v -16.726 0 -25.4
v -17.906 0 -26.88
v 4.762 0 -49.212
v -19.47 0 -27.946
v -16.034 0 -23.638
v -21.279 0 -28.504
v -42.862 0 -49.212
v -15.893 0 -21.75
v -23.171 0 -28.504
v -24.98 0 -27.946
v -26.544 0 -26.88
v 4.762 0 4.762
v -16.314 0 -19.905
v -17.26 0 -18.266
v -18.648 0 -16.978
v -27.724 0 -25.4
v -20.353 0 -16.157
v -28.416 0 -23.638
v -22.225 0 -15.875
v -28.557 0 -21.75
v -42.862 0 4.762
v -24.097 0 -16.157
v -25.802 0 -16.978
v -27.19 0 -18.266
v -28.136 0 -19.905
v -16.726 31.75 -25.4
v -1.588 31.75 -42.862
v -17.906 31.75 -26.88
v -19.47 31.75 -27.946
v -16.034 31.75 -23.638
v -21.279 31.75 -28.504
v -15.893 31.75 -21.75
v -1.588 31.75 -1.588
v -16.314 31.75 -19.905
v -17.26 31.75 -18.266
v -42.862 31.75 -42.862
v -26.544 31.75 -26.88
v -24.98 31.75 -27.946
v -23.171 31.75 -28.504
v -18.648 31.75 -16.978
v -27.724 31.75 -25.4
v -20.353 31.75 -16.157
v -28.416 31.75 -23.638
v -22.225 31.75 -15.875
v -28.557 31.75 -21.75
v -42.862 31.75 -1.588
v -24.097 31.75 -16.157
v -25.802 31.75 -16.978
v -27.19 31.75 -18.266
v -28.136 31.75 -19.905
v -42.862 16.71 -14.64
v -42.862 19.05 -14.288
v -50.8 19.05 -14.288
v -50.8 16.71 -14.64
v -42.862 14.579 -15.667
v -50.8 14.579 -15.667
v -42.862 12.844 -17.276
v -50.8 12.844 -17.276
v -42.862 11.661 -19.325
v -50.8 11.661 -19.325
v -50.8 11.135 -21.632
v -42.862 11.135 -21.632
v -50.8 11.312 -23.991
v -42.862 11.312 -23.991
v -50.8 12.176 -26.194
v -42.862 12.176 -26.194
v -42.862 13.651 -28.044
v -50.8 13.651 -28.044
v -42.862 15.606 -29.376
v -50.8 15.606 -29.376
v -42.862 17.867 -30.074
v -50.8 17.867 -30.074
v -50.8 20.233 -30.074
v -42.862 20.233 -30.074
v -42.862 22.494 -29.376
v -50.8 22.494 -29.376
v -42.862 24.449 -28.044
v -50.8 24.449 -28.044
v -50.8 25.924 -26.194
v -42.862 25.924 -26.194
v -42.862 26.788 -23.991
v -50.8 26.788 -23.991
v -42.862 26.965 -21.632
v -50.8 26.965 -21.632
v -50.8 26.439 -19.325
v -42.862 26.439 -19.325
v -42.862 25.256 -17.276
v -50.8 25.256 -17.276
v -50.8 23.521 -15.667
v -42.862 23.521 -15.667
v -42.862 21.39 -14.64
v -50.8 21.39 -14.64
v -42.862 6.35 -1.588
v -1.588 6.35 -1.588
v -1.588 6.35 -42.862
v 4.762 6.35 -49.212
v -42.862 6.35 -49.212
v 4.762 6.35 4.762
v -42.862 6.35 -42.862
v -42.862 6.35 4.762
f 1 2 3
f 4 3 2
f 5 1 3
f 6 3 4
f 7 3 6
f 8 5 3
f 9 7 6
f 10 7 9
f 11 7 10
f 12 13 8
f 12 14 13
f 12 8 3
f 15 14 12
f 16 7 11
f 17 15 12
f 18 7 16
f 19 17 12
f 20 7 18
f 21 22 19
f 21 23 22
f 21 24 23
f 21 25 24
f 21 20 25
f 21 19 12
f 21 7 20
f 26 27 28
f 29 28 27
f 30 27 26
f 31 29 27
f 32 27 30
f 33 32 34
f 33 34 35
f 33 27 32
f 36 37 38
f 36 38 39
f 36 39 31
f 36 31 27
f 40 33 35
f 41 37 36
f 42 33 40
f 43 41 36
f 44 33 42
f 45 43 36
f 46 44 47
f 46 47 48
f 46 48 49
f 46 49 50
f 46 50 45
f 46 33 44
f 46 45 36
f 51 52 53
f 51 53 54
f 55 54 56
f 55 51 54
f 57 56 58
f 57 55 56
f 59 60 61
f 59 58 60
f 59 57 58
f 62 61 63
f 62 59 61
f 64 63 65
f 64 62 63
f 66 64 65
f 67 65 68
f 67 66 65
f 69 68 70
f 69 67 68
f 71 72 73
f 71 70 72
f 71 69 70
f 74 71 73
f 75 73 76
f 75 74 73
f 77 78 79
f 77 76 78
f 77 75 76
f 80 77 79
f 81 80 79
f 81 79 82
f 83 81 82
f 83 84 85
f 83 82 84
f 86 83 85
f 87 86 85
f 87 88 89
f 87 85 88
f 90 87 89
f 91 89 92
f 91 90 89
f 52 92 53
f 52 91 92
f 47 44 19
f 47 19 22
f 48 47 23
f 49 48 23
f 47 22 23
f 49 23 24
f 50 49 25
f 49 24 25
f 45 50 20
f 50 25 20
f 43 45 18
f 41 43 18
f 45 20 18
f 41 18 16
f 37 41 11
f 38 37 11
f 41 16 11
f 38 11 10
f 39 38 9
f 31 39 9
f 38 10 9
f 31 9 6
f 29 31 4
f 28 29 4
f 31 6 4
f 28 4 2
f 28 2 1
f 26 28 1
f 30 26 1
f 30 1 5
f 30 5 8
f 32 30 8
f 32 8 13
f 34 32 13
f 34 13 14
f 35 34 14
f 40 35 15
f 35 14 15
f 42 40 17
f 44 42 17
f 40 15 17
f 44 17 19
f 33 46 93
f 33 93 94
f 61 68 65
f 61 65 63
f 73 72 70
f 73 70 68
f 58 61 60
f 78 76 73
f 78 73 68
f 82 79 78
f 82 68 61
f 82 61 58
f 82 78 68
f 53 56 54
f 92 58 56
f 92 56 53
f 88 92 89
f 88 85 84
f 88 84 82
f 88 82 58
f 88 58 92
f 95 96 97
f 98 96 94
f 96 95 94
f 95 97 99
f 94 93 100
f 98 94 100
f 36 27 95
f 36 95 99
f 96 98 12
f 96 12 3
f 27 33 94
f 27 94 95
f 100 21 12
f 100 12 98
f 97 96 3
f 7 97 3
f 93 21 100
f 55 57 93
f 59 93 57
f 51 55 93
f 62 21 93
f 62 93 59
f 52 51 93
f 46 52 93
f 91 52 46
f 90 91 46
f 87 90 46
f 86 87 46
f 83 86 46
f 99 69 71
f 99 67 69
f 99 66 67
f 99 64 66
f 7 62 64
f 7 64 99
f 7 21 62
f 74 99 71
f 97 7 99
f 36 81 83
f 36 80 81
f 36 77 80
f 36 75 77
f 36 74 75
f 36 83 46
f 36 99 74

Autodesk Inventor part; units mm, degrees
ref_plane "YZ Plane" through (0, 0, 0) normal (1, 0, 0) x (0, 1, 0)
ref_plane "XZ Plane" through (0, 0, 0) normal (0, 1, 0) x (-1, 0, 0)
ref_plane "XY Plane" through (0, 0, 0) normal (0, 0, 1) x (1, 0, 0)
sketch "Sketch1" plane through (0, 0, 0) normal (0, 1, 0) x (-1, 0, 0)
  line L0 (0, 0) -> (42.8625, 0)
  line L1 (42.8625, 0) -> (42.8625, -44.45)
  line L2 (42.8625, -44.45) -> (0, -44.45)
  line L3 (0, -44.45) -> (0, 0)
  dimension "d0" = 44.45
  dimension "d1" = 42.8625
extrude "Extrusion1" add sketch "Sketch1" along normal blind 31.75
sketch "Sketch2" plane through (-42.8625, 0, 0) normal (0, 0, 1) x (1, 0, 0)
  line L0 (0, 0) -> (0, 31.75) projected
  line L1 (42.8625, 0) -> (42.8625, 31.75) projected
  line L2 (42.8625, 0) -> (0, 0) projected
  line L3 (0, 6.35) -> (42.8625, 6.35)
  line L4 (42.8625, 6.35) -> (42.8625, 31.75)
  line L5 (42.8625, 31.75) -> (0, 31.75)
  line L6 (0, 31.75) -> (0, 6.35)
  dimension "d5" = 6.35
extrude "Extrusion2" cut sketch "Sketch2" against normal blind 1.5875 contours L0 L5 L1 L3
sketch "Sketch3" plane through (0, 0, 0) normal (1, 0, 0) x (0, 0, -1)
  line L0 (1.5875, 31.75) -> (1.5875, 6.35) projected
  line L1 (44.45, 0) -> (44.45, 31.75) projected
  line L2 (1.5875, 6.35) -> (44.45, 6.35)
  line L3 (44.45, 6.35) -> (44.45, 31.75)
  line L4 (44.45, 31.75) -> (1.5875, 31.75)
  line L5 (1.5875, 31.75) -> (1.5875, 6.35)
  point P0 (0, 0)
extrude "Extrusion3" cut sketch "Sketch3" against normal blind 1.5875
sketch "Sketch9" plane through (0, 31.75, 0) normal (0, 1, 0) x (1, 0, 0)
  line L0 (0, 44.45) -> (0, 0) projected
  line L1 (-1.5875, 44.45) -> (0, 44.45) projected
  point P0 (-22.225, 22.225)
  point P1 (-42.8625, 44.45)
  dimension "d23" = 22.225
  dimension "d24" = 22.225
hole "Hole1" at (-22.225, 31.75, -22.225) direction (0, -1, 0) diameter 12.7 end through all
sketch "Sketch19" plane through (0, 0, -44.45) normal (0, 0, -1) x (-1, 0, 0)
  line L0 (1.5875, 31.75) -> (42.8625, 31.75) projected
  line L1 (1.5875, 6.35) -> (42.8625, 6.35) projected
  line L2 (1.5875, 31.75) -> (42.8625, 31.75)
  line L3 (42.8625, 31.75) -> (42.8625, 6.35)
  line L4 (42.8625, 6.35) -> (1.5875, 6.35)
  line L5 (1.5875, 6.35) -> (1.5875, 31.75)
  point P0 (0, 0)
extrude "Extrusion14" cut sketch "Sketch19" against normal blind 1.5875
sketch "Sketch20" plane through (-42.8625, 0, -44.45) normal (-1, 0, 0) x (0, 0, 1)
  circle A0 centre (22.225, 19.05) radius 7.9375
  line L0 (44.45, 0) -> (0, 0) projected
  line L1 (44.45, 0) -> (44.45, 6.35) projected
  dimension "d59" = 15.875
  dimension "d60" = 19.05
  dimension "d61" = 22.225
extrude "Extrusion15" add sketch "Sketch20" along normal blind 7.9375
sketch "Sketch21" plane through (0, 0, -44.45) normal (0, 0, -1) x (-1, 0, 0)
  line L0 (42.8625, 6.35) -> (0, 6.35) projected
  line L1 (0, 0) -> (0, 6.35) projected
  line L2 (42.8625, 0) -> (0, 0) projected
  line L3 (42.8625, 0) -> (42.8625, 6.35) projected
  point P0 (0, 0)
extrude "Extrusion16" add sketch "Sketch21" along normal blind 4.7625
sketch "Sketch22" plane through (-42.8625, 0, 0) normal (0, 0, 1) x (1, 0, 0)
  line L0 (42.8625, 6.35) -> (0, 6.35) projected
  line L1 (0, 0) -> (0, 6.35) projected
  line L2 (42.8625, 0) -> (0, 0) projected
  line L3 (42.8625, 0) -> (42.8625, 6.35) projected
extrude "Extrusion17" add sketch "Sketch22" along normal blind 4.7625
sketch "Sketch23" plane through (0, 0, -49.2125) normal (1, 0, 0) x (0, 0, -1)
  line L0 (0, 6.35) -> (-53.975, 6.35) projected
  line L1 (-53.975, 0) -> (-53.975, 6.35) projected
  line L2 (0, 0) -> (-53.975, 0) projected
  line L3 (0, 6.35) -> (0, 0) projected
  point P0 (-49.2125, 0)
extrude "Extrusion18" add sketch "Sketch23" along normal blind 4.7625
equation "\"d24\" = d23"
properties part number "WackyPlug1.75"
